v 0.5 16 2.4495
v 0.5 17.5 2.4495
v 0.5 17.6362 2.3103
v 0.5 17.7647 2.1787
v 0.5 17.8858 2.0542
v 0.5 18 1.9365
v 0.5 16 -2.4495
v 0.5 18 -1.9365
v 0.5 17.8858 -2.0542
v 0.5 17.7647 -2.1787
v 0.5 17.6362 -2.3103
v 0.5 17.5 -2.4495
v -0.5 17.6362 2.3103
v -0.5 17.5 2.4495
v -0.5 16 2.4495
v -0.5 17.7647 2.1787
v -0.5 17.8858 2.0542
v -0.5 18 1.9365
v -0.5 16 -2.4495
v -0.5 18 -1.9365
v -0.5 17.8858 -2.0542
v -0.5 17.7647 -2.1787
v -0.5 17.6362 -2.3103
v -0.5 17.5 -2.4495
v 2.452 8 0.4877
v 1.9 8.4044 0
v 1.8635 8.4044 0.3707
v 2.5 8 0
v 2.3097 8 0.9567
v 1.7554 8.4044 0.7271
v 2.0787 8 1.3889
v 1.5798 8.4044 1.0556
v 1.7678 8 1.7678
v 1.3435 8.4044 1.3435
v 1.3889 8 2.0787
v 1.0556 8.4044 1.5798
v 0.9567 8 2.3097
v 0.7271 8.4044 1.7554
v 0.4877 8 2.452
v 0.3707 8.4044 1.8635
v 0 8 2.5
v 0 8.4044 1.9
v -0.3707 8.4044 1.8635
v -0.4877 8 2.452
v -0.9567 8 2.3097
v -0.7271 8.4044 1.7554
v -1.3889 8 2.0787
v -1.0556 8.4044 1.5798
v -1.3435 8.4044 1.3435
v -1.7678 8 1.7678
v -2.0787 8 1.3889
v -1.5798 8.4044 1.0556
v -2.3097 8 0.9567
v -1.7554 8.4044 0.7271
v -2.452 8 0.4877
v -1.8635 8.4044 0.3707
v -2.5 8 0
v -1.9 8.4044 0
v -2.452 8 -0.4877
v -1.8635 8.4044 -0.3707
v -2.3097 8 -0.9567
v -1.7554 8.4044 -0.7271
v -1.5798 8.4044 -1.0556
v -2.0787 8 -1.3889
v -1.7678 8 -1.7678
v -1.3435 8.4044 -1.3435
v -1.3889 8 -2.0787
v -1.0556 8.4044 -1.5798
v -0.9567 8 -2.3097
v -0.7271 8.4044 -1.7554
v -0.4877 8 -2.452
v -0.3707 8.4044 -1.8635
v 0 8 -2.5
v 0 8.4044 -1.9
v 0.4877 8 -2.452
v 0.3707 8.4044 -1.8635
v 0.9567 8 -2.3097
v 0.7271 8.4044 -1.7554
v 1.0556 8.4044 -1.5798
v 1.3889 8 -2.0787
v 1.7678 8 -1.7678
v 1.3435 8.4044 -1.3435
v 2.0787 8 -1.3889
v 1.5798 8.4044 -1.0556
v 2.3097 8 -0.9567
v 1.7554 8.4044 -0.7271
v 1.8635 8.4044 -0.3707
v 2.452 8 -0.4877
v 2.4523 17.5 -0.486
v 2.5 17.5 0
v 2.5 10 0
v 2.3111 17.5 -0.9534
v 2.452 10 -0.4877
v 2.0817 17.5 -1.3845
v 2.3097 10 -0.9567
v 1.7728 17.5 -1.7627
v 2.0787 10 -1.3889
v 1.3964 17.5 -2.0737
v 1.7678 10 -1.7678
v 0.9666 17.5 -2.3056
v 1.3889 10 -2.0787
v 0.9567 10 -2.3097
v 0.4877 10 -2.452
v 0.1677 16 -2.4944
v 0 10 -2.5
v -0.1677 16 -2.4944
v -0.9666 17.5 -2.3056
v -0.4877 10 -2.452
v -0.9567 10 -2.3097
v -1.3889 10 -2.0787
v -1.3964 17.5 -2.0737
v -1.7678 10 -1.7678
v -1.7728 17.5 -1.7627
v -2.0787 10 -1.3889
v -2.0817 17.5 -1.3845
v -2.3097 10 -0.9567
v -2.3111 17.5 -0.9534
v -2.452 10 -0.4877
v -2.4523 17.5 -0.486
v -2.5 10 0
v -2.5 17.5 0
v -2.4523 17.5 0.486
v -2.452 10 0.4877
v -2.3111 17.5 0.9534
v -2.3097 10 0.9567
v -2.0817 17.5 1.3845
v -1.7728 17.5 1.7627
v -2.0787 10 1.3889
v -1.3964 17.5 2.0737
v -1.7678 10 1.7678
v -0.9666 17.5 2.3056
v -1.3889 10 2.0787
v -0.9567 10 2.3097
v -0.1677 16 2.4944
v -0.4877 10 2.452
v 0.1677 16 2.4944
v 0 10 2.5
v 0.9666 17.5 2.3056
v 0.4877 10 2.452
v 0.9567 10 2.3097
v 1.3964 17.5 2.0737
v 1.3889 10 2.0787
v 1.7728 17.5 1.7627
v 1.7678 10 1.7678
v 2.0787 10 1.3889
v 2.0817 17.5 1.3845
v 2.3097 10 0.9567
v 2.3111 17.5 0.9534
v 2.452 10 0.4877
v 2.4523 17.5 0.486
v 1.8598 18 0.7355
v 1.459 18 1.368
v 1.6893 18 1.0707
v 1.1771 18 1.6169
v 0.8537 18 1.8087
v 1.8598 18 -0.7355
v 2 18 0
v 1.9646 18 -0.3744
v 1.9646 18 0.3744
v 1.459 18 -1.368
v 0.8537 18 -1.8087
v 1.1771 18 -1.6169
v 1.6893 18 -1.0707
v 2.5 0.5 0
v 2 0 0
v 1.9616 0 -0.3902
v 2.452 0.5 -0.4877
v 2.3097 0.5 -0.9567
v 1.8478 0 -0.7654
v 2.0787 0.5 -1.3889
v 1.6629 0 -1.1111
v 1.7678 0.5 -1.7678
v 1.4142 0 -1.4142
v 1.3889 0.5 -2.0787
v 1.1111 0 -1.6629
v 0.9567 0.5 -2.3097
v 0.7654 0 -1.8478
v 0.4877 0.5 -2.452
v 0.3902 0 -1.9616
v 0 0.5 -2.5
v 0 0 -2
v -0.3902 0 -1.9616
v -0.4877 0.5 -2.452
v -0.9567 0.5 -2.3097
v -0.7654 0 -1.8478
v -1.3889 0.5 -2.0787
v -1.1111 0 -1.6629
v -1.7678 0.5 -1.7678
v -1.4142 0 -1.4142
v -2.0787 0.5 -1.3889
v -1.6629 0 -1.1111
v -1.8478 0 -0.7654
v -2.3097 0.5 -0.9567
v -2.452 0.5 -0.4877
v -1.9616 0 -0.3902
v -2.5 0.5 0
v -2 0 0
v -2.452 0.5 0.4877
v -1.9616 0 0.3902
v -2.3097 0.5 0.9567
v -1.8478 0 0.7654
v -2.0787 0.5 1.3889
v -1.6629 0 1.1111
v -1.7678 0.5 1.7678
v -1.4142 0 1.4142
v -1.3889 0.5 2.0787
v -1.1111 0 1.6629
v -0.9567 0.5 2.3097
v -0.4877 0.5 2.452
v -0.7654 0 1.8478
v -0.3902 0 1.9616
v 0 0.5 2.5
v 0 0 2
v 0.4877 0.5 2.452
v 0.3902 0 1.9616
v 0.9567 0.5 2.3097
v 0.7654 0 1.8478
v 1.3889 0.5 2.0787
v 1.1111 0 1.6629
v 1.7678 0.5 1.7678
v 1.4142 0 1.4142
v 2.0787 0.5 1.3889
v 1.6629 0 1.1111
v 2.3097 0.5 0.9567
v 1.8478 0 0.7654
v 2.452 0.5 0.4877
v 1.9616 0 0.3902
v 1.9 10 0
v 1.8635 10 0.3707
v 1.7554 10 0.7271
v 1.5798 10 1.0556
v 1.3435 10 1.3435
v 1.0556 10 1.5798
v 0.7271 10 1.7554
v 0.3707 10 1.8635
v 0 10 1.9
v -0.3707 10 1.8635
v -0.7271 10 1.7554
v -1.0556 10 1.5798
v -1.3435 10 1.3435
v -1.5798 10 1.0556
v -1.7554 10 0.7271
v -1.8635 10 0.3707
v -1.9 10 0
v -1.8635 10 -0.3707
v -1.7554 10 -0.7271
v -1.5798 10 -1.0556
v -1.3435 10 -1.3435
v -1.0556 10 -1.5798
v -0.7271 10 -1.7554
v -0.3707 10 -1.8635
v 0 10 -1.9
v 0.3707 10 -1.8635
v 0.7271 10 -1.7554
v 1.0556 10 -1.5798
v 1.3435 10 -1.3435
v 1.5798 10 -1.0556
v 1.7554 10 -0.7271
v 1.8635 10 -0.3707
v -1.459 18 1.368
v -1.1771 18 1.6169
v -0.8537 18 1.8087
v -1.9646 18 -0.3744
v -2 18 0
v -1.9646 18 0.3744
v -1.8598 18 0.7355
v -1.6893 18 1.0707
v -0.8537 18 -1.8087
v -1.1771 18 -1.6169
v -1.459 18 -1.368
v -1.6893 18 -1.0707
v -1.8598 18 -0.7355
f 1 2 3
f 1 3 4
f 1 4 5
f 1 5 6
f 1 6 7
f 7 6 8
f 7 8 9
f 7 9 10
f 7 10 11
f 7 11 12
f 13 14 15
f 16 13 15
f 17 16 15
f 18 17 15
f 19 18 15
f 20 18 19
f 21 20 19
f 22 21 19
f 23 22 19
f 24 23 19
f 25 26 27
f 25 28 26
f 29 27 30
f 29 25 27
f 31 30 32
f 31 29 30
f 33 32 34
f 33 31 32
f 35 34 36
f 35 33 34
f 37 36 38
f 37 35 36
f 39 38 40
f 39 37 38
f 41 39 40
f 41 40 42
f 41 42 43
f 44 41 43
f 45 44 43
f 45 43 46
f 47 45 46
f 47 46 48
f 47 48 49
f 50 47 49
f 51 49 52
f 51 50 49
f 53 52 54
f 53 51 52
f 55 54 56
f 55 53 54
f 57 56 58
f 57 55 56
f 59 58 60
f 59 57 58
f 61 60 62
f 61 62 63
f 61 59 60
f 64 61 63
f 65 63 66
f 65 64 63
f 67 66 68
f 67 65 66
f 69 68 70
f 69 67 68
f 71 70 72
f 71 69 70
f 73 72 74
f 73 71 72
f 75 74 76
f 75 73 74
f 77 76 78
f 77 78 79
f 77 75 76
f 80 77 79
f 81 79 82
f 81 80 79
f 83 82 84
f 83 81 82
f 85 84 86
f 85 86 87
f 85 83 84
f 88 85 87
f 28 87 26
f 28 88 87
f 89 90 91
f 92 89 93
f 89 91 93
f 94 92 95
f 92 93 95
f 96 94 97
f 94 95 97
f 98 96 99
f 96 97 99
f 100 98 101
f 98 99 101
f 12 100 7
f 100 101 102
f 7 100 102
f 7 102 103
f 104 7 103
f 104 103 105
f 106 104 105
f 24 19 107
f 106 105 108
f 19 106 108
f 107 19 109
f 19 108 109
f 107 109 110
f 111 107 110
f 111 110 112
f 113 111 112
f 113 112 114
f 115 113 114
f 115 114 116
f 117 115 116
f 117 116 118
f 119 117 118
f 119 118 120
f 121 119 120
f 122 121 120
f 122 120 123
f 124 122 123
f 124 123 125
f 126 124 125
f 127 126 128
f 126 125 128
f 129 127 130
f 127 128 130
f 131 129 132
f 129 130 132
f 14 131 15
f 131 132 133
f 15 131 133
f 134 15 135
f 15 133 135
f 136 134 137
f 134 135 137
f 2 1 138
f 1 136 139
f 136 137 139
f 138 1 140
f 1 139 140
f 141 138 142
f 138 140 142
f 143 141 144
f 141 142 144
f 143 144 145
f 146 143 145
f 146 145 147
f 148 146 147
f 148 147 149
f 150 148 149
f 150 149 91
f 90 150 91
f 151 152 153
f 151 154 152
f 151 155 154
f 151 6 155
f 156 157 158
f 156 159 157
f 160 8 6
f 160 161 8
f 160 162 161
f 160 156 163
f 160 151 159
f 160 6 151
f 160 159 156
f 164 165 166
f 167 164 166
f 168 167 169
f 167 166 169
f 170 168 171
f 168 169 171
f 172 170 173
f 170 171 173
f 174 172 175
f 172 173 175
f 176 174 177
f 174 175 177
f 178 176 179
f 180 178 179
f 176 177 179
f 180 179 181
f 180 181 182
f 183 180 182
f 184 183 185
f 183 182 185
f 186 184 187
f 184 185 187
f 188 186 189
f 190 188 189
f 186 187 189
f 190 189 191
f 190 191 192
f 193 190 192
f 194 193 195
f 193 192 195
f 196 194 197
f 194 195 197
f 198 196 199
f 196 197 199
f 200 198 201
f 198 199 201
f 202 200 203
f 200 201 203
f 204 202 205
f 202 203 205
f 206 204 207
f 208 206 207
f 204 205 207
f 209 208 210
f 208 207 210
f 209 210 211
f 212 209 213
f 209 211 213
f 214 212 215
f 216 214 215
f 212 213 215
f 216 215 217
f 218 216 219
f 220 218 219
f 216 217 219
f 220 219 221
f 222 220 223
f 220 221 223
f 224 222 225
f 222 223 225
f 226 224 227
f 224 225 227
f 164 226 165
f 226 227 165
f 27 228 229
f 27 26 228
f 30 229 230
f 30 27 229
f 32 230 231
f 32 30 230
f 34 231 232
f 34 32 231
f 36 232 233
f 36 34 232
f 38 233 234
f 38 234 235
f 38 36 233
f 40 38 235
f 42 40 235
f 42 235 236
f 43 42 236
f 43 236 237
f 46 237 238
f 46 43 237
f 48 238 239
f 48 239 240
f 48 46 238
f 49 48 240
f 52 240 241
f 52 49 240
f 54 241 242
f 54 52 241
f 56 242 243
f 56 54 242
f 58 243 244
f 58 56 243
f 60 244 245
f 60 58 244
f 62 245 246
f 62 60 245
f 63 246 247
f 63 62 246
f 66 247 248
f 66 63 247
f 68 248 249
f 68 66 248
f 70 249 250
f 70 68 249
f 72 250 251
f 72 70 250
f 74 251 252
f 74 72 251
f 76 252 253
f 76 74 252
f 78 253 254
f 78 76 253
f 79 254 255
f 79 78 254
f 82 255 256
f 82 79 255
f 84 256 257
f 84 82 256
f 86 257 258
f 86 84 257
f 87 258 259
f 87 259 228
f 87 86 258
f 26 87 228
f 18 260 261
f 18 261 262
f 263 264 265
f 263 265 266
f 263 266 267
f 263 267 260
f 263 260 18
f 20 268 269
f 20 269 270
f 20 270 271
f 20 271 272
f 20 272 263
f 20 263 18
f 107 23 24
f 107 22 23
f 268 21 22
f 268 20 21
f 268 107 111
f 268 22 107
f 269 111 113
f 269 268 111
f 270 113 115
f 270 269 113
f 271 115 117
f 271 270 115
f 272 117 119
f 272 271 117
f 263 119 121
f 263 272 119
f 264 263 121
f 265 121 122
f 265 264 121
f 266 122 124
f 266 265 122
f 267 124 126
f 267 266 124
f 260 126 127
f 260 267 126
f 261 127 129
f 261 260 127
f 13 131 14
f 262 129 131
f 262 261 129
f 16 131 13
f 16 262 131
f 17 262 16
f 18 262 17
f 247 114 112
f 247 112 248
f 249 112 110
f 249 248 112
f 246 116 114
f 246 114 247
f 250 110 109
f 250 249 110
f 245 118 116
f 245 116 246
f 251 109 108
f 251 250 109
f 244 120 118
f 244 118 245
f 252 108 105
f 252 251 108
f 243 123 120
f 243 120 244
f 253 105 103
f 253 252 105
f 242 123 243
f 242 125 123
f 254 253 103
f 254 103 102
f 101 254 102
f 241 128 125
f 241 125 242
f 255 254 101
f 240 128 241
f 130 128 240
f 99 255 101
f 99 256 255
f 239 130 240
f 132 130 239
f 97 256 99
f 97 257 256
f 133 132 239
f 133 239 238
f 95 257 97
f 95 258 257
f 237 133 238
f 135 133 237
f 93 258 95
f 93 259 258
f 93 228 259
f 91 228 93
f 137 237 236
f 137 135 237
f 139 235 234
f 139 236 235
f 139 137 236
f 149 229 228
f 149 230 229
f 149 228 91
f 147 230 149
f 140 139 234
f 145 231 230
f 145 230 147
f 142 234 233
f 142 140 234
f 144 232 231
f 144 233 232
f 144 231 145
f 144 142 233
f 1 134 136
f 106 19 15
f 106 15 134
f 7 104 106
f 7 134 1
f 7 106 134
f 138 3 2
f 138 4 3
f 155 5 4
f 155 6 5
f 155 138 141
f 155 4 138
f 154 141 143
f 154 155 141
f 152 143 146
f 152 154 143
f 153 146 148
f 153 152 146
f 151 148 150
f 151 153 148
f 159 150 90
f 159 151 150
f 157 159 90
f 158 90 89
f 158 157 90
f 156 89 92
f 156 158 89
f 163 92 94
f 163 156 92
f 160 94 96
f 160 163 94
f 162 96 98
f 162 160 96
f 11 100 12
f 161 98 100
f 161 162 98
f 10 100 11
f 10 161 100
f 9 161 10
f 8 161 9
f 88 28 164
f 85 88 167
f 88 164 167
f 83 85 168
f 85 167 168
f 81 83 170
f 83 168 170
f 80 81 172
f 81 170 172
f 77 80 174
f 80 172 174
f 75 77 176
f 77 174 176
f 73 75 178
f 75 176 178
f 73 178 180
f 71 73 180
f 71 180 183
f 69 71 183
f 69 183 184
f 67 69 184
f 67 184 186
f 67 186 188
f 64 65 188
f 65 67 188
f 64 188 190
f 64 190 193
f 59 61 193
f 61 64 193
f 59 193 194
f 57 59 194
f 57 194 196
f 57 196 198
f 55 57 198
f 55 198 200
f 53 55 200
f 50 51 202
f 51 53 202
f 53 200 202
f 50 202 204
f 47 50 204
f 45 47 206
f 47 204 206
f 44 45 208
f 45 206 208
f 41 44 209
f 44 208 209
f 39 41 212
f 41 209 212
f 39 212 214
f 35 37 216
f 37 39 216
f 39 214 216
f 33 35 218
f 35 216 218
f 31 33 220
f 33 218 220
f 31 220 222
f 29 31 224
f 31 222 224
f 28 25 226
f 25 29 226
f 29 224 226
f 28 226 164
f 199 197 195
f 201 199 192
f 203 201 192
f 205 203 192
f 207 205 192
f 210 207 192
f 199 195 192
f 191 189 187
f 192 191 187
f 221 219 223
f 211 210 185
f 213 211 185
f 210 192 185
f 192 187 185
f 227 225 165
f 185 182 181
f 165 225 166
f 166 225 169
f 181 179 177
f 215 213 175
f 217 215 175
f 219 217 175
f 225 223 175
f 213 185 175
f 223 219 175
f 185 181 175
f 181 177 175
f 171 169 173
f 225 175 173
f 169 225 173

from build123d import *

# Parameters (mm, degrees)
SKIZZE1_R                       = 2.5
AUFSATZ_LINEAR_AUSTRAGEN1_DEPTH = 18
SKIZZE2_W                       = 1
SKIZZE2_H                       = 8.751437557
SCHNITT_LINEAR_AUSTRAGEN1_DEPTH = 2
FASE1_SIZE                      = 0.5


with BuildPart() as part:
    # Skizze1 → Aufsatz-Linear austragen1 (new body)
    with BuildSketch(Plane(origin=(0, 0, 0), x_dir=(1, 0, 0), z_dir=(0, 1, 0))):
        Circle(SKIZZE1_R)
    extrude(amount=AUFSATZ_LINEAR_AUSTRAGEN1_DEPTH)

    # Skizze2 → Schnitt-Linear austragen1 (cut)
    with BuildSketch(Plane(origin=(0, 18, 0), x_dir=(1, 0, 0), z_dir=(0, 1, 0))):
        with Locations((0, -0.571236499)):
            Rectangle(SKIZZE2_W, SKIZZE2_H)
    extrude(amount=-SCHNITT_LINEAR_AUSTRAGEN1_DEPTH, mode=Mode.SUBTRACT)

    # Fase1
    fase1_edges = [part.edges().sort_by_distance(p)[0] for p in [
        (-2.5, 0, 0),
        (1.936491673, 18, 1.58113883),
        (-2.5, 18, 0),
    ]]
    chamfer(fase1_edges, length=FASE1_SIZE)

    # Skizze3 → Schnitt-Rotation1 (revolve, cut)
    with BuildSketch(Plane.XY):
        Polygon((2.5, 10), (1.9, 10), (1.9, 8.404421135), (2.5, 8), align=None)
    revolve(axis=Axis((0, 12.232483269, 0), (0, -1, 0)), mode=Mode.SUBTRACT)


solid = part.part
